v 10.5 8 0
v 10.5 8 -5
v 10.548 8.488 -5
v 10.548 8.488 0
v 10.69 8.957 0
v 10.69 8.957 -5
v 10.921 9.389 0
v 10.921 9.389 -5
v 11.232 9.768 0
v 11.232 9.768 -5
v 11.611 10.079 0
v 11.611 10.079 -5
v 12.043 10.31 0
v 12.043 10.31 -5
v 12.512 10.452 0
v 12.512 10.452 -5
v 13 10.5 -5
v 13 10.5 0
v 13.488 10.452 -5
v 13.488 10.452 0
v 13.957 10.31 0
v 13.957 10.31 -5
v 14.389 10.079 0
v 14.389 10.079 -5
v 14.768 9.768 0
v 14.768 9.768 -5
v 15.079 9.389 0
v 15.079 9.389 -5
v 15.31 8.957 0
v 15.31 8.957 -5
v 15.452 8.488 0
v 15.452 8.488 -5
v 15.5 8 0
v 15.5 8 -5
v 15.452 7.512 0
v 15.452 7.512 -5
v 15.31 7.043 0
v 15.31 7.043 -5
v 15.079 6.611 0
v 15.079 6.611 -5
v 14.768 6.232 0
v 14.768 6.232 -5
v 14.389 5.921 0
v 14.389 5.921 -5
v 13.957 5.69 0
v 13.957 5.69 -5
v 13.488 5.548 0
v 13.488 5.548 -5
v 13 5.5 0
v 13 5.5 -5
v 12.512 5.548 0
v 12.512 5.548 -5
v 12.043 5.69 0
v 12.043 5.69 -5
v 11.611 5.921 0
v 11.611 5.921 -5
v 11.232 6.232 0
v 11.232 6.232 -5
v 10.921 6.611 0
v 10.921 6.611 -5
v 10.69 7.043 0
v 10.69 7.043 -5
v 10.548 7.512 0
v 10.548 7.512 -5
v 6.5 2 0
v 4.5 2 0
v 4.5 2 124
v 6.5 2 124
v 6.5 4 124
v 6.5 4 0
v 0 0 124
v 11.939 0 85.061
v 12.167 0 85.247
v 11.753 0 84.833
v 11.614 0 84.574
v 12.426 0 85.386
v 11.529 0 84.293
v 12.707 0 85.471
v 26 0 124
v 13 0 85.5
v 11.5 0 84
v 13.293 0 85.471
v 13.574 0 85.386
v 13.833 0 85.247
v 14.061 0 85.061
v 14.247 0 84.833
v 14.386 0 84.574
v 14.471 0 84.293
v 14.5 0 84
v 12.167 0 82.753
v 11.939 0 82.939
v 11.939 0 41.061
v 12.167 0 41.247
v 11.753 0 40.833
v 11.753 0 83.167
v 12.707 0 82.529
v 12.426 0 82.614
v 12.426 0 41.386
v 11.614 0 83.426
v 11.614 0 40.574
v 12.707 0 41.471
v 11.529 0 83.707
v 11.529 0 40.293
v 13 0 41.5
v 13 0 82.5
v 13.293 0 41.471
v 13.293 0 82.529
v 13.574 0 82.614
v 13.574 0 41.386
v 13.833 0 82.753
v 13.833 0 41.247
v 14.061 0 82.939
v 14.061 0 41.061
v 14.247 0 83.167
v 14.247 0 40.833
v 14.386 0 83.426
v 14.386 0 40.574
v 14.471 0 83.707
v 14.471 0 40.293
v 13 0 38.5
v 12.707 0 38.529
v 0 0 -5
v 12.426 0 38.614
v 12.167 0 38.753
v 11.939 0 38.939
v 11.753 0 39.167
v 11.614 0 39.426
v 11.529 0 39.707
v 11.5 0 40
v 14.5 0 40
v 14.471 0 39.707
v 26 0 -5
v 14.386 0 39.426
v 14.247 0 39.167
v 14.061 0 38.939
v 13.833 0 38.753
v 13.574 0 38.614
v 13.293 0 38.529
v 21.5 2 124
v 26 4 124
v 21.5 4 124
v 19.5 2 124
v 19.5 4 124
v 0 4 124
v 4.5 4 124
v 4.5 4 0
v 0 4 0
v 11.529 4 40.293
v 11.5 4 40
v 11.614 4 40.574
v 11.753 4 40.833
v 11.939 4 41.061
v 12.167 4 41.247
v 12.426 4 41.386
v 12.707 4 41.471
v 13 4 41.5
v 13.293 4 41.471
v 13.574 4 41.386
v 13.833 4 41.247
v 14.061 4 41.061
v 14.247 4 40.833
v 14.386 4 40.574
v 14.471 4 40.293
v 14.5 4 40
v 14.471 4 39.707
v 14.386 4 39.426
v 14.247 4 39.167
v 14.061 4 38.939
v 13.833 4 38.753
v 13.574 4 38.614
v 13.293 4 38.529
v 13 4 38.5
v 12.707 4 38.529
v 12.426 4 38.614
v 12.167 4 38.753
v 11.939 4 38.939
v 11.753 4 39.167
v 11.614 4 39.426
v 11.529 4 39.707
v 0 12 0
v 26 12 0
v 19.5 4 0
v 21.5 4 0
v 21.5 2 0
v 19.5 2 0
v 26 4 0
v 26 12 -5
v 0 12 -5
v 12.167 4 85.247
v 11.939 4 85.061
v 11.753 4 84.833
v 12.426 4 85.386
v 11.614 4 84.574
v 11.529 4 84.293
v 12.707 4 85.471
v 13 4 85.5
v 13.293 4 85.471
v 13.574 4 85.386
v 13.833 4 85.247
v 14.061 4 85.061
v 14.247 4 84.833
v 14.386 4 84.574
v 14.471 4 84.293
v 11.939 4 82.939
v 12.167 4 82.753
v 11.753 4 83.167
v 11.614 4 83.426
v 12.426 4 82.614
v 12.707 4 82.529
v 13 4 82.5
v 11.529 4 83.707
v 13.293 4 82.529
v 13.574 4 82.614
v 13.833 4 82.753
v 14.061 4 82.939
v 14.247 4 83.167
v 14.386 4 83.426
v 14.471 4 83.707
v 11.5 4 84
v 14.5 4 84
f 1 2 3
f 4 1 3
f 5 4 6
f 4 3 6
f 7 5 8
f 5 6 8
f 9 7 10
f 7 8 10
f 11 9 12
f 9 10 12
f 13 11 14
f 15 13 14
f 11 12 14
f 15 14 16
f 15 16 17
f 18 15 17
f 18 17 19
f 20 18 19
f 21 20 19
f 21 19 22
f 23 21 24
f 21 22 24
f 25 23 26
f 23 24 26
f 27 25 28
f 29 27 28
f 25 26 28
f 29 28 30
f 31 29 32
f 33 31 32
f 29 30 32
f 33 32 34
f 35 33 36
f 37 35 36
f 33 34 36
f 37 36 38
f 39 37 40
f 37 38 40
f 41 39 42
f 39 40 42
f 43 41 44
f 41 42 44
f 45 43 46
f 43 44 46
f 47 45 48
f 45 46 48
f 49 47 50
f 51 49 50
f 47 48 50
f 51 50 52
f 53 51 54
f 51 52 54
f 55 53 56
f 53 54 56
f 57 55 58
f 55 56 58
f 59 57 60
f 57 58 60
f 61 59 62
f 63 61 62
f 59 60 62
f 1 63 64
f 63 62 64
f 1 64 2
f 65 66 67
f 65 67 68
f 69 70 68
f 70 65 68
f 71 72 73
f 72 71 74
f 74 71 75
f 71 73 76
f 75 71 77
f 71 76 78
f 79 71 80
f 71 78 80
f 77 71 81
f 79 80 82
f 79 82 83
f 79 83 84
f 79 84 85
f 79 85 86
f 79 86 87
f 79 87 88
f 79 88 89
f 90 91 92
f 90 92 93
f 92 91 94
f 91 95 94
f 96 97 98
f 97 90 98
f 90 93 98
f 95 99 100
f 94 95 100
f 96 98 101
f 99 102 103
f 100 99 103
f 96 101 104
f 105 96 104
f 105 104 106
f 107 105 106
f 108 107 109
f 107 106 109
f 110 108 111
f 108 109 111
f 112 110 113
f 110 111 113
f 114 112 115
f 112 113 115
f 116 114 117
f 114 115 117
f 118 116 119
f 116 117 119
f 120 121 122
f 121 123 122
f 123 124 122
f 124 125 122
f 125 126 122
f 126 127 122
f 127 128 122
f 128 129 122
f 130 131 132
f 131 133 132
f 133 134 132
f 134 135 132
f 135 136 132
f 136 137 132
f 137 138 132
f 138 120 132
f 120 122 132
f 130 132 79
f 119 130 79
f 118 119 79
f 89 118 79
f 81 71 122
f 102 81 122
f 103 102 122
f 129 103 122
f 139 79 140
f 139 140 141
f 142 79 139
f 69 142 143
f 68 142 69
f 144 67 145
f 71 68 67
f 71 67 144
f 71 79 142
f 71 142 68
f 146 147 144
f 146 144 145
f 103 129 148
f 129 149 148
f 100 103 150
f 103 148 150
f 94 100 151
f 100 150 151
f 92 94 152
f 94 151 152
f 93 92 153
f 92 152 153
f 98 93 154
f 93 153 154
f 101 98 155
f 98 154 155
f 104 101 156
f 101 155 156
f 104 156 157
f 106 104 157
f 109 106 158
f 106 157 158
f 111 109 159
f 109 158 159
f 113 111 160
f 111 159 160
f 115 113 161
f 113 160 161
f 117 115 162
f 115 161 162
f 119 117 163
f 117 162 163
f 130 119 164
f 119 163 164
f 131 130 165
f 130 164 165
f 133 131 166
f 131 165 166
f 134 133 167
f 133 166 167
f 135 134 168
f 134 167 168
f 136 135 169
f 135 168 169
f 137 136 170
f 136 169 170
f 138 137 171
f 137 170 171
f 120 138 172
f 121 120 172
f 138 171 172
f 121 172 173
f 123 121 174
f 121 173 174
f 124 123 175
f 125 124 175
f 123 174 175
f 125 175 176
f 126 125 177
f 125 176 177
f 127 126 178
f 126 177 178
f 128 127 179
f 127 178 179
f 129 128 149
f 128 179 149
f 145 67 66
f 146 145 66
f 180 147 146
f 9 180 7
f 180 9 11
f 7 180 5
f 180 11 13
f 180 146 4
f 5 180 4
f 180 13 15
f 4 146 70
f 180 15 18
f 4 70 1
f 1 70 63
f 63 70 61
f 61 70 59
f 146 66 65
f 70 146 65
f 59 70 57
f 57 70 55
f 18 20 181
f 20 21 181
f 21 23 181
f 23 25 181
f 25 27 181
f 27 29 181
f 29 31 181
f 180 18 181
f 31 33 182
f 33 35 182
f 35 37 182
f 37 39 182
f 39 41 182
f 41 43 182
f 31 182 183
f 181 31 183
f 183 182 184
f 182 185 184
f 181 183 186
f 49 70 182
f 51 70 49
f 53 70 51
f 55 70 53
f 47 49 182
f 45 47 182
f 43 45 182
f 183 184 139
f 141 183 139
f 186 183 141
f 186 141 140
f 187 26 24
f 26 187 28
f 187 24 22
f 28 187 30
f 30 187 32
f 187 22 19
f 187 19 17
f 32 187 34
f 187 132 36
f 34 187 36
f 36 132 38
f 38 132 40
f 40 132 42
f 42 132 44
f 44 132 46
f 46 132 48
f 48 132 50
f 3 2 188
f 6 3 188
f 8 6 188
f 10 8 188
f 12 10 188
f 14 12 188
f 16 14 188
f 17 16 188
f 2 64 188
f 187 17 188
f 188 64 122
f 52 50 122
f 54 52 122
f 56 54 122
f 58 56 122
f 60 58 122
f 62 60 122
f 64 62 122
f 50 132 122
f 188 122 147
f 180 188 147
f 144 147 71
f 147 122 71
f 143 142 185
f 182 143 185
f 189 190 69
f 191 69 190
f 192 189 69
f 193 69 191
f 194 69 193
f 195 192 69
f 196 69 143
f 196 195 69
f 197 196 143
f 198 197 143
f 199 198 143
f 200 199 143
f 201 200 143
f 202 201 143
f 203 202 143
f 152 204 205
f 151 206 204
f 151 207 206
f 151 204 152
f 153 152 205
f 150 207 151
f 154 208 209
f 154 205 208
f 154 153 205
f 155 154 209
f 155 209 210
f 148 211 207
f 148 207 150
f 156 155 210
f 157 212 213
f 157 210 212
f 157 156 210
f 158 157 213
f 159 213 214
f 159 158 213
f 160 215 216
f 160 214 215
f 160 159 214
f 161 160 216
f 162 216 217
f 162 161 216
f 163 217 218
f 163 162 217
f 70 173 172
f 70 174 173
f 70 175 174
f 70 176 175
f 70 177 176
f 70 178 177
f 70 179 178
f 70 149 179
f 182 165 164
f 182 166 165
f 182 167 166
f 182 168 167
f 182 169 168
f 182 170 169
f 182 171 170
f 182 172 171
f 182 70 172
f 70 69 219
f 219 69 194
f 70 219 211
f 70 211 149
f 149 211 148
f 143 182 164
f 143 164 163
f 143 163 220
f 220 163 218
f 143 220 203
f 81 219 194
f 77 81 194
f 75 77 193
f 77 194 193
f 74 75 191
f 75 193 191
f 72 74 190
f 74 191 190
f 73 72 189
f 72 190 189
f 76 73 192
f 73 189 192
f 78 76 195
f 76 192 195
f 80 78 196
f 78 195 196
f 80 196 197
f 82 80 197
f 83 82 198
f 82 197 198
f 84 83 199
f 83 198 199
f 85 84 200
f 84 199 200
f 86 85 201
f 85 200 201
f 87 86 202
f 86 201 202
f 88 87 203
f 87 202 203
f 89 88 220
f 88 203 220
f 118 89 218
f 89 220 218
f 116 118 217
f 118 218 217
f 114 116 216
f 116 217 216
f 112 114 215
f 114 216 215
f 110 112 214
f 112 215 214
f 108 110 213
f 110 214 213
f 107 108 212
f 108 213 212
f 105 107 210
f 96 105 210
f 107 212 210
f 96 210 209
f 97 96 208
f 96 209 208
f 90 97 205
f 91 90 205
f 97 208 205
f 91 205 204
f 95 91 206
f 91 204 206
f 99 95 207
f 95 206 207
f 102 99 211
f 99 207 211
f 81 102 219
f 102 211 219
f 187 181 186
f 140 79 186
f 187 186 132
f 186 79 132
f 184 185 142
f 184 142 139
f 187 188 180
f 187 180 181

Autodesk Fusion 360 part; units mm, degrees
sketch "Eskiz1" plane through (0, 0, 0) normal (0, 1, 0) x (1, 0, 0)
  line L0 (0, 0) -> (26, 0)
  line L1 (26, 0) -> (26, -124)
  line L2 (26, -124) -> (0, -124)
  line L3 (0, -124) -> (0, 0)
  line L4 (4.5, 0) -> (6.5, 0)
  line L5 (6.5, 0) -> (6.5, -124)
  line L6 (6.5, -124) -> (4.5, -124)
  line L7 (4.5, -124) -> (4.5, 0)
  line L8 (19.5, 0) -> (21.5, 0)
  line L9 (21.5, 0) -> (21.5, -124)
  line L10 (21.5, -124) -> (19.5, -124)
  line L11 (19.5, -124) -> (19.5, 0)
  line L12 (0, 0) -> (26, 0)
  line L13 (26, 0) -> (26, 5)
  line L14 (26, 5) -> (0, 5)
  line L15 (0, 5) -> (0, 0)
  line L16 (0, -124) -> (26, -124)
  line L17 (26, -124) -> (26, -129)
  line L18 (26, -129) -> (0, -129)
  line L19 (0, -129) -> (0, -124)
  dimension "d1" = 26
  dimension "d2" = 124
  dimension "d3" = 2
  dimension "d4" = 4.5
  dimension "d5" = 2
  dimension "d6" = 13
  dimension "d11" = 5
  dimension "d18" = 5
extrude "Ekstrüde Et1" add sketch "Eskiz1" along normal blind 2 contours L0 L2 L4 L5 L6 L7 L12 L16 | L0 L2 L8 L9 L10 L11 L12 L16 makes body 1 at (6.5, 0.6667, 41.3333) makes body 2 at (21.5, 0.6667, 41.3333)
extrude "Ekstrüde Et2" add sketch "Eskiz1" along normal blind 4 contours L0 L2 L3 L7 L12 L16 | L0 L2 L5 L11 L12 L16 | L0 L1 L2 L9 L12 L16 bodies 1 2
extrude "Ekstrüde Et3" add sketch "Eskiz1" along normal blind 12 contours L0 L4 L8 L12 L13 L14 L15 bodies 1
sketch "Eskiz2" plane through (0, 0, -5) normal (0, 0, -1) x (-1, 0, 0)
  line L0 (-26, 0) -> (0, 0)
  line L1 (0, 0) -> (0, 12)
  line L2 (0, 12) -> (-26, 12)
  line L3 (-26, 12) -> (-26, 0)
  circle A0 centre (-13, 8) radius 2.5
  dimension "d14" = 5
  dimension "d15" = 4
extrude "Ekstrüde Et4" cut sketch "Eskiz2" against normal blind 6 contours A0 bodies 1
sketch "Eskiz3" plane through (0, 4, 0) normal (0, 1, 0) x (-1, 0, 0)
  line L0 (-6.5, 0) -> (-6.5, 124)
  line L1 (-6.5, 124) -> (-19.5, 124)
  line L2 (-19.5, 124) -> (-19.5, 0)
  line L3 (-19.5, 0) -> (-6.5, 0)
  circle A0 centre (-13, 84) radius 1.5
  circle A1 centre (-13, 40) radius 1.5
  dimension "d19" = 3
  dimension "d20" = 3
  dimension "d21" = 40
  dimension "d22" = 40
extrude "Ekstrüde Et5" cut sketch "Eskiz3" against normal blind 15 contours A0 | A1 bodies 1
